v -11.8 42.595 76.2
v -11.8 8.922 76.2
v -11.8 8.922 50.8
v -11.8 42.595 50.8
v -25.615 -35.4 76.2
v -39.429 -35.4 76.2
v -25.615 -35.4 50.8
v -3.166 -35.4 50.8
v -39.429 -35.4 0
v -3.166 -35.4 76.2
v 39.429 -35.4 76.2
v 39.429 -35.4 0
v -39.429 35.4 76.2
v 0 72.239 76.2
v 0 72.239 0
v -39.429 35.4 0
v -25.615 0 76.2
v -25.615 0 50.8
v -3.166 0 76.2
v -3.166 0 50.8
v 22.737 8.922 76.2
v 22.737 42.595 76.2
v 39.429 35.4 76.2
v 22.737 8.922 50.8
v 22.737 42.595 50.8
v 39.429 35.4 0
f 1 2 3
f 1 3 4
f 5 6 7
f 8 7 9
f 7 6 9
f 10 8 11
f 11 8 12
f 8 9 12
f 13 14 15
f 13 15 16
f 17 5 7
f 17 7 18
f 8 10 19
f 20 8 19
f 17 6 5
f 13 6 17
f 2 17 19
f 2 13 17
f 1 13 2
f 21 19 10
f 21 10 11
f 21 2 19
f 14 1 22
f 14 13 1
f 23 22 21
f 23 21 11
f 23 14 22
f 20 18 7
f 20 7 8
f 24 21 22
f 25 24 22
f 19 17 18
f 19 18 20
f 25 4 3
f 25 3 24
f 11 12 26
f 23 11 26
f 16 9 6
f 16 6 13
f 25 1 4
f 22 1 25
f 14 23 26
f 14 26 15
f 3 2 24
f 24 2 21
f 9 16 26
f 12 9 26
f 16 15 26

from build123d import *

# Parameters (mm, degrees)
F0_W     = 78.858778
F0_H     = 70.800216
F1_DEPTH = 76.2
F2_W     = 22.448848
F2_H     = 35.400108
F3_DEPTH = 25.4
F5_W     = 34.536688
F5_H     = 33.673274
F6_DEPTH = 25.4


with BuildPart() as f1:
    # F0 (on Top) → F1 (new body)
    with BuildSketch(Plane.XY):
        Rectangle(F0_W, F0_H)
        Polygon((0, 72.239242), (-39.429389, 35.400108), (39.429389, 35.400108), align=None)
    extrude(amount=F1_DEPTH)

    # F2 (on face) → F3 (cut)
    with BuildSketch(Plane.XY.offset(76.2)):
        with Locations((-14.390288, -17.700054)):
            Rectangle(F2_W, F2_H)
    extrude(amount=-F3_DEPTH, mode=Mode.SUBTRACT)

    # F5 (on face) → F6 (cut)
    with BuildSketch(Plane.XY.offset(76.2)):
        with Locations((5.468308, 25.758615)):
            Rectangle(F5_W, F5_H)
    extrude(amount=-F6_DEPTH, mode=Mode.SUBTRACT)


solid = f1.part
